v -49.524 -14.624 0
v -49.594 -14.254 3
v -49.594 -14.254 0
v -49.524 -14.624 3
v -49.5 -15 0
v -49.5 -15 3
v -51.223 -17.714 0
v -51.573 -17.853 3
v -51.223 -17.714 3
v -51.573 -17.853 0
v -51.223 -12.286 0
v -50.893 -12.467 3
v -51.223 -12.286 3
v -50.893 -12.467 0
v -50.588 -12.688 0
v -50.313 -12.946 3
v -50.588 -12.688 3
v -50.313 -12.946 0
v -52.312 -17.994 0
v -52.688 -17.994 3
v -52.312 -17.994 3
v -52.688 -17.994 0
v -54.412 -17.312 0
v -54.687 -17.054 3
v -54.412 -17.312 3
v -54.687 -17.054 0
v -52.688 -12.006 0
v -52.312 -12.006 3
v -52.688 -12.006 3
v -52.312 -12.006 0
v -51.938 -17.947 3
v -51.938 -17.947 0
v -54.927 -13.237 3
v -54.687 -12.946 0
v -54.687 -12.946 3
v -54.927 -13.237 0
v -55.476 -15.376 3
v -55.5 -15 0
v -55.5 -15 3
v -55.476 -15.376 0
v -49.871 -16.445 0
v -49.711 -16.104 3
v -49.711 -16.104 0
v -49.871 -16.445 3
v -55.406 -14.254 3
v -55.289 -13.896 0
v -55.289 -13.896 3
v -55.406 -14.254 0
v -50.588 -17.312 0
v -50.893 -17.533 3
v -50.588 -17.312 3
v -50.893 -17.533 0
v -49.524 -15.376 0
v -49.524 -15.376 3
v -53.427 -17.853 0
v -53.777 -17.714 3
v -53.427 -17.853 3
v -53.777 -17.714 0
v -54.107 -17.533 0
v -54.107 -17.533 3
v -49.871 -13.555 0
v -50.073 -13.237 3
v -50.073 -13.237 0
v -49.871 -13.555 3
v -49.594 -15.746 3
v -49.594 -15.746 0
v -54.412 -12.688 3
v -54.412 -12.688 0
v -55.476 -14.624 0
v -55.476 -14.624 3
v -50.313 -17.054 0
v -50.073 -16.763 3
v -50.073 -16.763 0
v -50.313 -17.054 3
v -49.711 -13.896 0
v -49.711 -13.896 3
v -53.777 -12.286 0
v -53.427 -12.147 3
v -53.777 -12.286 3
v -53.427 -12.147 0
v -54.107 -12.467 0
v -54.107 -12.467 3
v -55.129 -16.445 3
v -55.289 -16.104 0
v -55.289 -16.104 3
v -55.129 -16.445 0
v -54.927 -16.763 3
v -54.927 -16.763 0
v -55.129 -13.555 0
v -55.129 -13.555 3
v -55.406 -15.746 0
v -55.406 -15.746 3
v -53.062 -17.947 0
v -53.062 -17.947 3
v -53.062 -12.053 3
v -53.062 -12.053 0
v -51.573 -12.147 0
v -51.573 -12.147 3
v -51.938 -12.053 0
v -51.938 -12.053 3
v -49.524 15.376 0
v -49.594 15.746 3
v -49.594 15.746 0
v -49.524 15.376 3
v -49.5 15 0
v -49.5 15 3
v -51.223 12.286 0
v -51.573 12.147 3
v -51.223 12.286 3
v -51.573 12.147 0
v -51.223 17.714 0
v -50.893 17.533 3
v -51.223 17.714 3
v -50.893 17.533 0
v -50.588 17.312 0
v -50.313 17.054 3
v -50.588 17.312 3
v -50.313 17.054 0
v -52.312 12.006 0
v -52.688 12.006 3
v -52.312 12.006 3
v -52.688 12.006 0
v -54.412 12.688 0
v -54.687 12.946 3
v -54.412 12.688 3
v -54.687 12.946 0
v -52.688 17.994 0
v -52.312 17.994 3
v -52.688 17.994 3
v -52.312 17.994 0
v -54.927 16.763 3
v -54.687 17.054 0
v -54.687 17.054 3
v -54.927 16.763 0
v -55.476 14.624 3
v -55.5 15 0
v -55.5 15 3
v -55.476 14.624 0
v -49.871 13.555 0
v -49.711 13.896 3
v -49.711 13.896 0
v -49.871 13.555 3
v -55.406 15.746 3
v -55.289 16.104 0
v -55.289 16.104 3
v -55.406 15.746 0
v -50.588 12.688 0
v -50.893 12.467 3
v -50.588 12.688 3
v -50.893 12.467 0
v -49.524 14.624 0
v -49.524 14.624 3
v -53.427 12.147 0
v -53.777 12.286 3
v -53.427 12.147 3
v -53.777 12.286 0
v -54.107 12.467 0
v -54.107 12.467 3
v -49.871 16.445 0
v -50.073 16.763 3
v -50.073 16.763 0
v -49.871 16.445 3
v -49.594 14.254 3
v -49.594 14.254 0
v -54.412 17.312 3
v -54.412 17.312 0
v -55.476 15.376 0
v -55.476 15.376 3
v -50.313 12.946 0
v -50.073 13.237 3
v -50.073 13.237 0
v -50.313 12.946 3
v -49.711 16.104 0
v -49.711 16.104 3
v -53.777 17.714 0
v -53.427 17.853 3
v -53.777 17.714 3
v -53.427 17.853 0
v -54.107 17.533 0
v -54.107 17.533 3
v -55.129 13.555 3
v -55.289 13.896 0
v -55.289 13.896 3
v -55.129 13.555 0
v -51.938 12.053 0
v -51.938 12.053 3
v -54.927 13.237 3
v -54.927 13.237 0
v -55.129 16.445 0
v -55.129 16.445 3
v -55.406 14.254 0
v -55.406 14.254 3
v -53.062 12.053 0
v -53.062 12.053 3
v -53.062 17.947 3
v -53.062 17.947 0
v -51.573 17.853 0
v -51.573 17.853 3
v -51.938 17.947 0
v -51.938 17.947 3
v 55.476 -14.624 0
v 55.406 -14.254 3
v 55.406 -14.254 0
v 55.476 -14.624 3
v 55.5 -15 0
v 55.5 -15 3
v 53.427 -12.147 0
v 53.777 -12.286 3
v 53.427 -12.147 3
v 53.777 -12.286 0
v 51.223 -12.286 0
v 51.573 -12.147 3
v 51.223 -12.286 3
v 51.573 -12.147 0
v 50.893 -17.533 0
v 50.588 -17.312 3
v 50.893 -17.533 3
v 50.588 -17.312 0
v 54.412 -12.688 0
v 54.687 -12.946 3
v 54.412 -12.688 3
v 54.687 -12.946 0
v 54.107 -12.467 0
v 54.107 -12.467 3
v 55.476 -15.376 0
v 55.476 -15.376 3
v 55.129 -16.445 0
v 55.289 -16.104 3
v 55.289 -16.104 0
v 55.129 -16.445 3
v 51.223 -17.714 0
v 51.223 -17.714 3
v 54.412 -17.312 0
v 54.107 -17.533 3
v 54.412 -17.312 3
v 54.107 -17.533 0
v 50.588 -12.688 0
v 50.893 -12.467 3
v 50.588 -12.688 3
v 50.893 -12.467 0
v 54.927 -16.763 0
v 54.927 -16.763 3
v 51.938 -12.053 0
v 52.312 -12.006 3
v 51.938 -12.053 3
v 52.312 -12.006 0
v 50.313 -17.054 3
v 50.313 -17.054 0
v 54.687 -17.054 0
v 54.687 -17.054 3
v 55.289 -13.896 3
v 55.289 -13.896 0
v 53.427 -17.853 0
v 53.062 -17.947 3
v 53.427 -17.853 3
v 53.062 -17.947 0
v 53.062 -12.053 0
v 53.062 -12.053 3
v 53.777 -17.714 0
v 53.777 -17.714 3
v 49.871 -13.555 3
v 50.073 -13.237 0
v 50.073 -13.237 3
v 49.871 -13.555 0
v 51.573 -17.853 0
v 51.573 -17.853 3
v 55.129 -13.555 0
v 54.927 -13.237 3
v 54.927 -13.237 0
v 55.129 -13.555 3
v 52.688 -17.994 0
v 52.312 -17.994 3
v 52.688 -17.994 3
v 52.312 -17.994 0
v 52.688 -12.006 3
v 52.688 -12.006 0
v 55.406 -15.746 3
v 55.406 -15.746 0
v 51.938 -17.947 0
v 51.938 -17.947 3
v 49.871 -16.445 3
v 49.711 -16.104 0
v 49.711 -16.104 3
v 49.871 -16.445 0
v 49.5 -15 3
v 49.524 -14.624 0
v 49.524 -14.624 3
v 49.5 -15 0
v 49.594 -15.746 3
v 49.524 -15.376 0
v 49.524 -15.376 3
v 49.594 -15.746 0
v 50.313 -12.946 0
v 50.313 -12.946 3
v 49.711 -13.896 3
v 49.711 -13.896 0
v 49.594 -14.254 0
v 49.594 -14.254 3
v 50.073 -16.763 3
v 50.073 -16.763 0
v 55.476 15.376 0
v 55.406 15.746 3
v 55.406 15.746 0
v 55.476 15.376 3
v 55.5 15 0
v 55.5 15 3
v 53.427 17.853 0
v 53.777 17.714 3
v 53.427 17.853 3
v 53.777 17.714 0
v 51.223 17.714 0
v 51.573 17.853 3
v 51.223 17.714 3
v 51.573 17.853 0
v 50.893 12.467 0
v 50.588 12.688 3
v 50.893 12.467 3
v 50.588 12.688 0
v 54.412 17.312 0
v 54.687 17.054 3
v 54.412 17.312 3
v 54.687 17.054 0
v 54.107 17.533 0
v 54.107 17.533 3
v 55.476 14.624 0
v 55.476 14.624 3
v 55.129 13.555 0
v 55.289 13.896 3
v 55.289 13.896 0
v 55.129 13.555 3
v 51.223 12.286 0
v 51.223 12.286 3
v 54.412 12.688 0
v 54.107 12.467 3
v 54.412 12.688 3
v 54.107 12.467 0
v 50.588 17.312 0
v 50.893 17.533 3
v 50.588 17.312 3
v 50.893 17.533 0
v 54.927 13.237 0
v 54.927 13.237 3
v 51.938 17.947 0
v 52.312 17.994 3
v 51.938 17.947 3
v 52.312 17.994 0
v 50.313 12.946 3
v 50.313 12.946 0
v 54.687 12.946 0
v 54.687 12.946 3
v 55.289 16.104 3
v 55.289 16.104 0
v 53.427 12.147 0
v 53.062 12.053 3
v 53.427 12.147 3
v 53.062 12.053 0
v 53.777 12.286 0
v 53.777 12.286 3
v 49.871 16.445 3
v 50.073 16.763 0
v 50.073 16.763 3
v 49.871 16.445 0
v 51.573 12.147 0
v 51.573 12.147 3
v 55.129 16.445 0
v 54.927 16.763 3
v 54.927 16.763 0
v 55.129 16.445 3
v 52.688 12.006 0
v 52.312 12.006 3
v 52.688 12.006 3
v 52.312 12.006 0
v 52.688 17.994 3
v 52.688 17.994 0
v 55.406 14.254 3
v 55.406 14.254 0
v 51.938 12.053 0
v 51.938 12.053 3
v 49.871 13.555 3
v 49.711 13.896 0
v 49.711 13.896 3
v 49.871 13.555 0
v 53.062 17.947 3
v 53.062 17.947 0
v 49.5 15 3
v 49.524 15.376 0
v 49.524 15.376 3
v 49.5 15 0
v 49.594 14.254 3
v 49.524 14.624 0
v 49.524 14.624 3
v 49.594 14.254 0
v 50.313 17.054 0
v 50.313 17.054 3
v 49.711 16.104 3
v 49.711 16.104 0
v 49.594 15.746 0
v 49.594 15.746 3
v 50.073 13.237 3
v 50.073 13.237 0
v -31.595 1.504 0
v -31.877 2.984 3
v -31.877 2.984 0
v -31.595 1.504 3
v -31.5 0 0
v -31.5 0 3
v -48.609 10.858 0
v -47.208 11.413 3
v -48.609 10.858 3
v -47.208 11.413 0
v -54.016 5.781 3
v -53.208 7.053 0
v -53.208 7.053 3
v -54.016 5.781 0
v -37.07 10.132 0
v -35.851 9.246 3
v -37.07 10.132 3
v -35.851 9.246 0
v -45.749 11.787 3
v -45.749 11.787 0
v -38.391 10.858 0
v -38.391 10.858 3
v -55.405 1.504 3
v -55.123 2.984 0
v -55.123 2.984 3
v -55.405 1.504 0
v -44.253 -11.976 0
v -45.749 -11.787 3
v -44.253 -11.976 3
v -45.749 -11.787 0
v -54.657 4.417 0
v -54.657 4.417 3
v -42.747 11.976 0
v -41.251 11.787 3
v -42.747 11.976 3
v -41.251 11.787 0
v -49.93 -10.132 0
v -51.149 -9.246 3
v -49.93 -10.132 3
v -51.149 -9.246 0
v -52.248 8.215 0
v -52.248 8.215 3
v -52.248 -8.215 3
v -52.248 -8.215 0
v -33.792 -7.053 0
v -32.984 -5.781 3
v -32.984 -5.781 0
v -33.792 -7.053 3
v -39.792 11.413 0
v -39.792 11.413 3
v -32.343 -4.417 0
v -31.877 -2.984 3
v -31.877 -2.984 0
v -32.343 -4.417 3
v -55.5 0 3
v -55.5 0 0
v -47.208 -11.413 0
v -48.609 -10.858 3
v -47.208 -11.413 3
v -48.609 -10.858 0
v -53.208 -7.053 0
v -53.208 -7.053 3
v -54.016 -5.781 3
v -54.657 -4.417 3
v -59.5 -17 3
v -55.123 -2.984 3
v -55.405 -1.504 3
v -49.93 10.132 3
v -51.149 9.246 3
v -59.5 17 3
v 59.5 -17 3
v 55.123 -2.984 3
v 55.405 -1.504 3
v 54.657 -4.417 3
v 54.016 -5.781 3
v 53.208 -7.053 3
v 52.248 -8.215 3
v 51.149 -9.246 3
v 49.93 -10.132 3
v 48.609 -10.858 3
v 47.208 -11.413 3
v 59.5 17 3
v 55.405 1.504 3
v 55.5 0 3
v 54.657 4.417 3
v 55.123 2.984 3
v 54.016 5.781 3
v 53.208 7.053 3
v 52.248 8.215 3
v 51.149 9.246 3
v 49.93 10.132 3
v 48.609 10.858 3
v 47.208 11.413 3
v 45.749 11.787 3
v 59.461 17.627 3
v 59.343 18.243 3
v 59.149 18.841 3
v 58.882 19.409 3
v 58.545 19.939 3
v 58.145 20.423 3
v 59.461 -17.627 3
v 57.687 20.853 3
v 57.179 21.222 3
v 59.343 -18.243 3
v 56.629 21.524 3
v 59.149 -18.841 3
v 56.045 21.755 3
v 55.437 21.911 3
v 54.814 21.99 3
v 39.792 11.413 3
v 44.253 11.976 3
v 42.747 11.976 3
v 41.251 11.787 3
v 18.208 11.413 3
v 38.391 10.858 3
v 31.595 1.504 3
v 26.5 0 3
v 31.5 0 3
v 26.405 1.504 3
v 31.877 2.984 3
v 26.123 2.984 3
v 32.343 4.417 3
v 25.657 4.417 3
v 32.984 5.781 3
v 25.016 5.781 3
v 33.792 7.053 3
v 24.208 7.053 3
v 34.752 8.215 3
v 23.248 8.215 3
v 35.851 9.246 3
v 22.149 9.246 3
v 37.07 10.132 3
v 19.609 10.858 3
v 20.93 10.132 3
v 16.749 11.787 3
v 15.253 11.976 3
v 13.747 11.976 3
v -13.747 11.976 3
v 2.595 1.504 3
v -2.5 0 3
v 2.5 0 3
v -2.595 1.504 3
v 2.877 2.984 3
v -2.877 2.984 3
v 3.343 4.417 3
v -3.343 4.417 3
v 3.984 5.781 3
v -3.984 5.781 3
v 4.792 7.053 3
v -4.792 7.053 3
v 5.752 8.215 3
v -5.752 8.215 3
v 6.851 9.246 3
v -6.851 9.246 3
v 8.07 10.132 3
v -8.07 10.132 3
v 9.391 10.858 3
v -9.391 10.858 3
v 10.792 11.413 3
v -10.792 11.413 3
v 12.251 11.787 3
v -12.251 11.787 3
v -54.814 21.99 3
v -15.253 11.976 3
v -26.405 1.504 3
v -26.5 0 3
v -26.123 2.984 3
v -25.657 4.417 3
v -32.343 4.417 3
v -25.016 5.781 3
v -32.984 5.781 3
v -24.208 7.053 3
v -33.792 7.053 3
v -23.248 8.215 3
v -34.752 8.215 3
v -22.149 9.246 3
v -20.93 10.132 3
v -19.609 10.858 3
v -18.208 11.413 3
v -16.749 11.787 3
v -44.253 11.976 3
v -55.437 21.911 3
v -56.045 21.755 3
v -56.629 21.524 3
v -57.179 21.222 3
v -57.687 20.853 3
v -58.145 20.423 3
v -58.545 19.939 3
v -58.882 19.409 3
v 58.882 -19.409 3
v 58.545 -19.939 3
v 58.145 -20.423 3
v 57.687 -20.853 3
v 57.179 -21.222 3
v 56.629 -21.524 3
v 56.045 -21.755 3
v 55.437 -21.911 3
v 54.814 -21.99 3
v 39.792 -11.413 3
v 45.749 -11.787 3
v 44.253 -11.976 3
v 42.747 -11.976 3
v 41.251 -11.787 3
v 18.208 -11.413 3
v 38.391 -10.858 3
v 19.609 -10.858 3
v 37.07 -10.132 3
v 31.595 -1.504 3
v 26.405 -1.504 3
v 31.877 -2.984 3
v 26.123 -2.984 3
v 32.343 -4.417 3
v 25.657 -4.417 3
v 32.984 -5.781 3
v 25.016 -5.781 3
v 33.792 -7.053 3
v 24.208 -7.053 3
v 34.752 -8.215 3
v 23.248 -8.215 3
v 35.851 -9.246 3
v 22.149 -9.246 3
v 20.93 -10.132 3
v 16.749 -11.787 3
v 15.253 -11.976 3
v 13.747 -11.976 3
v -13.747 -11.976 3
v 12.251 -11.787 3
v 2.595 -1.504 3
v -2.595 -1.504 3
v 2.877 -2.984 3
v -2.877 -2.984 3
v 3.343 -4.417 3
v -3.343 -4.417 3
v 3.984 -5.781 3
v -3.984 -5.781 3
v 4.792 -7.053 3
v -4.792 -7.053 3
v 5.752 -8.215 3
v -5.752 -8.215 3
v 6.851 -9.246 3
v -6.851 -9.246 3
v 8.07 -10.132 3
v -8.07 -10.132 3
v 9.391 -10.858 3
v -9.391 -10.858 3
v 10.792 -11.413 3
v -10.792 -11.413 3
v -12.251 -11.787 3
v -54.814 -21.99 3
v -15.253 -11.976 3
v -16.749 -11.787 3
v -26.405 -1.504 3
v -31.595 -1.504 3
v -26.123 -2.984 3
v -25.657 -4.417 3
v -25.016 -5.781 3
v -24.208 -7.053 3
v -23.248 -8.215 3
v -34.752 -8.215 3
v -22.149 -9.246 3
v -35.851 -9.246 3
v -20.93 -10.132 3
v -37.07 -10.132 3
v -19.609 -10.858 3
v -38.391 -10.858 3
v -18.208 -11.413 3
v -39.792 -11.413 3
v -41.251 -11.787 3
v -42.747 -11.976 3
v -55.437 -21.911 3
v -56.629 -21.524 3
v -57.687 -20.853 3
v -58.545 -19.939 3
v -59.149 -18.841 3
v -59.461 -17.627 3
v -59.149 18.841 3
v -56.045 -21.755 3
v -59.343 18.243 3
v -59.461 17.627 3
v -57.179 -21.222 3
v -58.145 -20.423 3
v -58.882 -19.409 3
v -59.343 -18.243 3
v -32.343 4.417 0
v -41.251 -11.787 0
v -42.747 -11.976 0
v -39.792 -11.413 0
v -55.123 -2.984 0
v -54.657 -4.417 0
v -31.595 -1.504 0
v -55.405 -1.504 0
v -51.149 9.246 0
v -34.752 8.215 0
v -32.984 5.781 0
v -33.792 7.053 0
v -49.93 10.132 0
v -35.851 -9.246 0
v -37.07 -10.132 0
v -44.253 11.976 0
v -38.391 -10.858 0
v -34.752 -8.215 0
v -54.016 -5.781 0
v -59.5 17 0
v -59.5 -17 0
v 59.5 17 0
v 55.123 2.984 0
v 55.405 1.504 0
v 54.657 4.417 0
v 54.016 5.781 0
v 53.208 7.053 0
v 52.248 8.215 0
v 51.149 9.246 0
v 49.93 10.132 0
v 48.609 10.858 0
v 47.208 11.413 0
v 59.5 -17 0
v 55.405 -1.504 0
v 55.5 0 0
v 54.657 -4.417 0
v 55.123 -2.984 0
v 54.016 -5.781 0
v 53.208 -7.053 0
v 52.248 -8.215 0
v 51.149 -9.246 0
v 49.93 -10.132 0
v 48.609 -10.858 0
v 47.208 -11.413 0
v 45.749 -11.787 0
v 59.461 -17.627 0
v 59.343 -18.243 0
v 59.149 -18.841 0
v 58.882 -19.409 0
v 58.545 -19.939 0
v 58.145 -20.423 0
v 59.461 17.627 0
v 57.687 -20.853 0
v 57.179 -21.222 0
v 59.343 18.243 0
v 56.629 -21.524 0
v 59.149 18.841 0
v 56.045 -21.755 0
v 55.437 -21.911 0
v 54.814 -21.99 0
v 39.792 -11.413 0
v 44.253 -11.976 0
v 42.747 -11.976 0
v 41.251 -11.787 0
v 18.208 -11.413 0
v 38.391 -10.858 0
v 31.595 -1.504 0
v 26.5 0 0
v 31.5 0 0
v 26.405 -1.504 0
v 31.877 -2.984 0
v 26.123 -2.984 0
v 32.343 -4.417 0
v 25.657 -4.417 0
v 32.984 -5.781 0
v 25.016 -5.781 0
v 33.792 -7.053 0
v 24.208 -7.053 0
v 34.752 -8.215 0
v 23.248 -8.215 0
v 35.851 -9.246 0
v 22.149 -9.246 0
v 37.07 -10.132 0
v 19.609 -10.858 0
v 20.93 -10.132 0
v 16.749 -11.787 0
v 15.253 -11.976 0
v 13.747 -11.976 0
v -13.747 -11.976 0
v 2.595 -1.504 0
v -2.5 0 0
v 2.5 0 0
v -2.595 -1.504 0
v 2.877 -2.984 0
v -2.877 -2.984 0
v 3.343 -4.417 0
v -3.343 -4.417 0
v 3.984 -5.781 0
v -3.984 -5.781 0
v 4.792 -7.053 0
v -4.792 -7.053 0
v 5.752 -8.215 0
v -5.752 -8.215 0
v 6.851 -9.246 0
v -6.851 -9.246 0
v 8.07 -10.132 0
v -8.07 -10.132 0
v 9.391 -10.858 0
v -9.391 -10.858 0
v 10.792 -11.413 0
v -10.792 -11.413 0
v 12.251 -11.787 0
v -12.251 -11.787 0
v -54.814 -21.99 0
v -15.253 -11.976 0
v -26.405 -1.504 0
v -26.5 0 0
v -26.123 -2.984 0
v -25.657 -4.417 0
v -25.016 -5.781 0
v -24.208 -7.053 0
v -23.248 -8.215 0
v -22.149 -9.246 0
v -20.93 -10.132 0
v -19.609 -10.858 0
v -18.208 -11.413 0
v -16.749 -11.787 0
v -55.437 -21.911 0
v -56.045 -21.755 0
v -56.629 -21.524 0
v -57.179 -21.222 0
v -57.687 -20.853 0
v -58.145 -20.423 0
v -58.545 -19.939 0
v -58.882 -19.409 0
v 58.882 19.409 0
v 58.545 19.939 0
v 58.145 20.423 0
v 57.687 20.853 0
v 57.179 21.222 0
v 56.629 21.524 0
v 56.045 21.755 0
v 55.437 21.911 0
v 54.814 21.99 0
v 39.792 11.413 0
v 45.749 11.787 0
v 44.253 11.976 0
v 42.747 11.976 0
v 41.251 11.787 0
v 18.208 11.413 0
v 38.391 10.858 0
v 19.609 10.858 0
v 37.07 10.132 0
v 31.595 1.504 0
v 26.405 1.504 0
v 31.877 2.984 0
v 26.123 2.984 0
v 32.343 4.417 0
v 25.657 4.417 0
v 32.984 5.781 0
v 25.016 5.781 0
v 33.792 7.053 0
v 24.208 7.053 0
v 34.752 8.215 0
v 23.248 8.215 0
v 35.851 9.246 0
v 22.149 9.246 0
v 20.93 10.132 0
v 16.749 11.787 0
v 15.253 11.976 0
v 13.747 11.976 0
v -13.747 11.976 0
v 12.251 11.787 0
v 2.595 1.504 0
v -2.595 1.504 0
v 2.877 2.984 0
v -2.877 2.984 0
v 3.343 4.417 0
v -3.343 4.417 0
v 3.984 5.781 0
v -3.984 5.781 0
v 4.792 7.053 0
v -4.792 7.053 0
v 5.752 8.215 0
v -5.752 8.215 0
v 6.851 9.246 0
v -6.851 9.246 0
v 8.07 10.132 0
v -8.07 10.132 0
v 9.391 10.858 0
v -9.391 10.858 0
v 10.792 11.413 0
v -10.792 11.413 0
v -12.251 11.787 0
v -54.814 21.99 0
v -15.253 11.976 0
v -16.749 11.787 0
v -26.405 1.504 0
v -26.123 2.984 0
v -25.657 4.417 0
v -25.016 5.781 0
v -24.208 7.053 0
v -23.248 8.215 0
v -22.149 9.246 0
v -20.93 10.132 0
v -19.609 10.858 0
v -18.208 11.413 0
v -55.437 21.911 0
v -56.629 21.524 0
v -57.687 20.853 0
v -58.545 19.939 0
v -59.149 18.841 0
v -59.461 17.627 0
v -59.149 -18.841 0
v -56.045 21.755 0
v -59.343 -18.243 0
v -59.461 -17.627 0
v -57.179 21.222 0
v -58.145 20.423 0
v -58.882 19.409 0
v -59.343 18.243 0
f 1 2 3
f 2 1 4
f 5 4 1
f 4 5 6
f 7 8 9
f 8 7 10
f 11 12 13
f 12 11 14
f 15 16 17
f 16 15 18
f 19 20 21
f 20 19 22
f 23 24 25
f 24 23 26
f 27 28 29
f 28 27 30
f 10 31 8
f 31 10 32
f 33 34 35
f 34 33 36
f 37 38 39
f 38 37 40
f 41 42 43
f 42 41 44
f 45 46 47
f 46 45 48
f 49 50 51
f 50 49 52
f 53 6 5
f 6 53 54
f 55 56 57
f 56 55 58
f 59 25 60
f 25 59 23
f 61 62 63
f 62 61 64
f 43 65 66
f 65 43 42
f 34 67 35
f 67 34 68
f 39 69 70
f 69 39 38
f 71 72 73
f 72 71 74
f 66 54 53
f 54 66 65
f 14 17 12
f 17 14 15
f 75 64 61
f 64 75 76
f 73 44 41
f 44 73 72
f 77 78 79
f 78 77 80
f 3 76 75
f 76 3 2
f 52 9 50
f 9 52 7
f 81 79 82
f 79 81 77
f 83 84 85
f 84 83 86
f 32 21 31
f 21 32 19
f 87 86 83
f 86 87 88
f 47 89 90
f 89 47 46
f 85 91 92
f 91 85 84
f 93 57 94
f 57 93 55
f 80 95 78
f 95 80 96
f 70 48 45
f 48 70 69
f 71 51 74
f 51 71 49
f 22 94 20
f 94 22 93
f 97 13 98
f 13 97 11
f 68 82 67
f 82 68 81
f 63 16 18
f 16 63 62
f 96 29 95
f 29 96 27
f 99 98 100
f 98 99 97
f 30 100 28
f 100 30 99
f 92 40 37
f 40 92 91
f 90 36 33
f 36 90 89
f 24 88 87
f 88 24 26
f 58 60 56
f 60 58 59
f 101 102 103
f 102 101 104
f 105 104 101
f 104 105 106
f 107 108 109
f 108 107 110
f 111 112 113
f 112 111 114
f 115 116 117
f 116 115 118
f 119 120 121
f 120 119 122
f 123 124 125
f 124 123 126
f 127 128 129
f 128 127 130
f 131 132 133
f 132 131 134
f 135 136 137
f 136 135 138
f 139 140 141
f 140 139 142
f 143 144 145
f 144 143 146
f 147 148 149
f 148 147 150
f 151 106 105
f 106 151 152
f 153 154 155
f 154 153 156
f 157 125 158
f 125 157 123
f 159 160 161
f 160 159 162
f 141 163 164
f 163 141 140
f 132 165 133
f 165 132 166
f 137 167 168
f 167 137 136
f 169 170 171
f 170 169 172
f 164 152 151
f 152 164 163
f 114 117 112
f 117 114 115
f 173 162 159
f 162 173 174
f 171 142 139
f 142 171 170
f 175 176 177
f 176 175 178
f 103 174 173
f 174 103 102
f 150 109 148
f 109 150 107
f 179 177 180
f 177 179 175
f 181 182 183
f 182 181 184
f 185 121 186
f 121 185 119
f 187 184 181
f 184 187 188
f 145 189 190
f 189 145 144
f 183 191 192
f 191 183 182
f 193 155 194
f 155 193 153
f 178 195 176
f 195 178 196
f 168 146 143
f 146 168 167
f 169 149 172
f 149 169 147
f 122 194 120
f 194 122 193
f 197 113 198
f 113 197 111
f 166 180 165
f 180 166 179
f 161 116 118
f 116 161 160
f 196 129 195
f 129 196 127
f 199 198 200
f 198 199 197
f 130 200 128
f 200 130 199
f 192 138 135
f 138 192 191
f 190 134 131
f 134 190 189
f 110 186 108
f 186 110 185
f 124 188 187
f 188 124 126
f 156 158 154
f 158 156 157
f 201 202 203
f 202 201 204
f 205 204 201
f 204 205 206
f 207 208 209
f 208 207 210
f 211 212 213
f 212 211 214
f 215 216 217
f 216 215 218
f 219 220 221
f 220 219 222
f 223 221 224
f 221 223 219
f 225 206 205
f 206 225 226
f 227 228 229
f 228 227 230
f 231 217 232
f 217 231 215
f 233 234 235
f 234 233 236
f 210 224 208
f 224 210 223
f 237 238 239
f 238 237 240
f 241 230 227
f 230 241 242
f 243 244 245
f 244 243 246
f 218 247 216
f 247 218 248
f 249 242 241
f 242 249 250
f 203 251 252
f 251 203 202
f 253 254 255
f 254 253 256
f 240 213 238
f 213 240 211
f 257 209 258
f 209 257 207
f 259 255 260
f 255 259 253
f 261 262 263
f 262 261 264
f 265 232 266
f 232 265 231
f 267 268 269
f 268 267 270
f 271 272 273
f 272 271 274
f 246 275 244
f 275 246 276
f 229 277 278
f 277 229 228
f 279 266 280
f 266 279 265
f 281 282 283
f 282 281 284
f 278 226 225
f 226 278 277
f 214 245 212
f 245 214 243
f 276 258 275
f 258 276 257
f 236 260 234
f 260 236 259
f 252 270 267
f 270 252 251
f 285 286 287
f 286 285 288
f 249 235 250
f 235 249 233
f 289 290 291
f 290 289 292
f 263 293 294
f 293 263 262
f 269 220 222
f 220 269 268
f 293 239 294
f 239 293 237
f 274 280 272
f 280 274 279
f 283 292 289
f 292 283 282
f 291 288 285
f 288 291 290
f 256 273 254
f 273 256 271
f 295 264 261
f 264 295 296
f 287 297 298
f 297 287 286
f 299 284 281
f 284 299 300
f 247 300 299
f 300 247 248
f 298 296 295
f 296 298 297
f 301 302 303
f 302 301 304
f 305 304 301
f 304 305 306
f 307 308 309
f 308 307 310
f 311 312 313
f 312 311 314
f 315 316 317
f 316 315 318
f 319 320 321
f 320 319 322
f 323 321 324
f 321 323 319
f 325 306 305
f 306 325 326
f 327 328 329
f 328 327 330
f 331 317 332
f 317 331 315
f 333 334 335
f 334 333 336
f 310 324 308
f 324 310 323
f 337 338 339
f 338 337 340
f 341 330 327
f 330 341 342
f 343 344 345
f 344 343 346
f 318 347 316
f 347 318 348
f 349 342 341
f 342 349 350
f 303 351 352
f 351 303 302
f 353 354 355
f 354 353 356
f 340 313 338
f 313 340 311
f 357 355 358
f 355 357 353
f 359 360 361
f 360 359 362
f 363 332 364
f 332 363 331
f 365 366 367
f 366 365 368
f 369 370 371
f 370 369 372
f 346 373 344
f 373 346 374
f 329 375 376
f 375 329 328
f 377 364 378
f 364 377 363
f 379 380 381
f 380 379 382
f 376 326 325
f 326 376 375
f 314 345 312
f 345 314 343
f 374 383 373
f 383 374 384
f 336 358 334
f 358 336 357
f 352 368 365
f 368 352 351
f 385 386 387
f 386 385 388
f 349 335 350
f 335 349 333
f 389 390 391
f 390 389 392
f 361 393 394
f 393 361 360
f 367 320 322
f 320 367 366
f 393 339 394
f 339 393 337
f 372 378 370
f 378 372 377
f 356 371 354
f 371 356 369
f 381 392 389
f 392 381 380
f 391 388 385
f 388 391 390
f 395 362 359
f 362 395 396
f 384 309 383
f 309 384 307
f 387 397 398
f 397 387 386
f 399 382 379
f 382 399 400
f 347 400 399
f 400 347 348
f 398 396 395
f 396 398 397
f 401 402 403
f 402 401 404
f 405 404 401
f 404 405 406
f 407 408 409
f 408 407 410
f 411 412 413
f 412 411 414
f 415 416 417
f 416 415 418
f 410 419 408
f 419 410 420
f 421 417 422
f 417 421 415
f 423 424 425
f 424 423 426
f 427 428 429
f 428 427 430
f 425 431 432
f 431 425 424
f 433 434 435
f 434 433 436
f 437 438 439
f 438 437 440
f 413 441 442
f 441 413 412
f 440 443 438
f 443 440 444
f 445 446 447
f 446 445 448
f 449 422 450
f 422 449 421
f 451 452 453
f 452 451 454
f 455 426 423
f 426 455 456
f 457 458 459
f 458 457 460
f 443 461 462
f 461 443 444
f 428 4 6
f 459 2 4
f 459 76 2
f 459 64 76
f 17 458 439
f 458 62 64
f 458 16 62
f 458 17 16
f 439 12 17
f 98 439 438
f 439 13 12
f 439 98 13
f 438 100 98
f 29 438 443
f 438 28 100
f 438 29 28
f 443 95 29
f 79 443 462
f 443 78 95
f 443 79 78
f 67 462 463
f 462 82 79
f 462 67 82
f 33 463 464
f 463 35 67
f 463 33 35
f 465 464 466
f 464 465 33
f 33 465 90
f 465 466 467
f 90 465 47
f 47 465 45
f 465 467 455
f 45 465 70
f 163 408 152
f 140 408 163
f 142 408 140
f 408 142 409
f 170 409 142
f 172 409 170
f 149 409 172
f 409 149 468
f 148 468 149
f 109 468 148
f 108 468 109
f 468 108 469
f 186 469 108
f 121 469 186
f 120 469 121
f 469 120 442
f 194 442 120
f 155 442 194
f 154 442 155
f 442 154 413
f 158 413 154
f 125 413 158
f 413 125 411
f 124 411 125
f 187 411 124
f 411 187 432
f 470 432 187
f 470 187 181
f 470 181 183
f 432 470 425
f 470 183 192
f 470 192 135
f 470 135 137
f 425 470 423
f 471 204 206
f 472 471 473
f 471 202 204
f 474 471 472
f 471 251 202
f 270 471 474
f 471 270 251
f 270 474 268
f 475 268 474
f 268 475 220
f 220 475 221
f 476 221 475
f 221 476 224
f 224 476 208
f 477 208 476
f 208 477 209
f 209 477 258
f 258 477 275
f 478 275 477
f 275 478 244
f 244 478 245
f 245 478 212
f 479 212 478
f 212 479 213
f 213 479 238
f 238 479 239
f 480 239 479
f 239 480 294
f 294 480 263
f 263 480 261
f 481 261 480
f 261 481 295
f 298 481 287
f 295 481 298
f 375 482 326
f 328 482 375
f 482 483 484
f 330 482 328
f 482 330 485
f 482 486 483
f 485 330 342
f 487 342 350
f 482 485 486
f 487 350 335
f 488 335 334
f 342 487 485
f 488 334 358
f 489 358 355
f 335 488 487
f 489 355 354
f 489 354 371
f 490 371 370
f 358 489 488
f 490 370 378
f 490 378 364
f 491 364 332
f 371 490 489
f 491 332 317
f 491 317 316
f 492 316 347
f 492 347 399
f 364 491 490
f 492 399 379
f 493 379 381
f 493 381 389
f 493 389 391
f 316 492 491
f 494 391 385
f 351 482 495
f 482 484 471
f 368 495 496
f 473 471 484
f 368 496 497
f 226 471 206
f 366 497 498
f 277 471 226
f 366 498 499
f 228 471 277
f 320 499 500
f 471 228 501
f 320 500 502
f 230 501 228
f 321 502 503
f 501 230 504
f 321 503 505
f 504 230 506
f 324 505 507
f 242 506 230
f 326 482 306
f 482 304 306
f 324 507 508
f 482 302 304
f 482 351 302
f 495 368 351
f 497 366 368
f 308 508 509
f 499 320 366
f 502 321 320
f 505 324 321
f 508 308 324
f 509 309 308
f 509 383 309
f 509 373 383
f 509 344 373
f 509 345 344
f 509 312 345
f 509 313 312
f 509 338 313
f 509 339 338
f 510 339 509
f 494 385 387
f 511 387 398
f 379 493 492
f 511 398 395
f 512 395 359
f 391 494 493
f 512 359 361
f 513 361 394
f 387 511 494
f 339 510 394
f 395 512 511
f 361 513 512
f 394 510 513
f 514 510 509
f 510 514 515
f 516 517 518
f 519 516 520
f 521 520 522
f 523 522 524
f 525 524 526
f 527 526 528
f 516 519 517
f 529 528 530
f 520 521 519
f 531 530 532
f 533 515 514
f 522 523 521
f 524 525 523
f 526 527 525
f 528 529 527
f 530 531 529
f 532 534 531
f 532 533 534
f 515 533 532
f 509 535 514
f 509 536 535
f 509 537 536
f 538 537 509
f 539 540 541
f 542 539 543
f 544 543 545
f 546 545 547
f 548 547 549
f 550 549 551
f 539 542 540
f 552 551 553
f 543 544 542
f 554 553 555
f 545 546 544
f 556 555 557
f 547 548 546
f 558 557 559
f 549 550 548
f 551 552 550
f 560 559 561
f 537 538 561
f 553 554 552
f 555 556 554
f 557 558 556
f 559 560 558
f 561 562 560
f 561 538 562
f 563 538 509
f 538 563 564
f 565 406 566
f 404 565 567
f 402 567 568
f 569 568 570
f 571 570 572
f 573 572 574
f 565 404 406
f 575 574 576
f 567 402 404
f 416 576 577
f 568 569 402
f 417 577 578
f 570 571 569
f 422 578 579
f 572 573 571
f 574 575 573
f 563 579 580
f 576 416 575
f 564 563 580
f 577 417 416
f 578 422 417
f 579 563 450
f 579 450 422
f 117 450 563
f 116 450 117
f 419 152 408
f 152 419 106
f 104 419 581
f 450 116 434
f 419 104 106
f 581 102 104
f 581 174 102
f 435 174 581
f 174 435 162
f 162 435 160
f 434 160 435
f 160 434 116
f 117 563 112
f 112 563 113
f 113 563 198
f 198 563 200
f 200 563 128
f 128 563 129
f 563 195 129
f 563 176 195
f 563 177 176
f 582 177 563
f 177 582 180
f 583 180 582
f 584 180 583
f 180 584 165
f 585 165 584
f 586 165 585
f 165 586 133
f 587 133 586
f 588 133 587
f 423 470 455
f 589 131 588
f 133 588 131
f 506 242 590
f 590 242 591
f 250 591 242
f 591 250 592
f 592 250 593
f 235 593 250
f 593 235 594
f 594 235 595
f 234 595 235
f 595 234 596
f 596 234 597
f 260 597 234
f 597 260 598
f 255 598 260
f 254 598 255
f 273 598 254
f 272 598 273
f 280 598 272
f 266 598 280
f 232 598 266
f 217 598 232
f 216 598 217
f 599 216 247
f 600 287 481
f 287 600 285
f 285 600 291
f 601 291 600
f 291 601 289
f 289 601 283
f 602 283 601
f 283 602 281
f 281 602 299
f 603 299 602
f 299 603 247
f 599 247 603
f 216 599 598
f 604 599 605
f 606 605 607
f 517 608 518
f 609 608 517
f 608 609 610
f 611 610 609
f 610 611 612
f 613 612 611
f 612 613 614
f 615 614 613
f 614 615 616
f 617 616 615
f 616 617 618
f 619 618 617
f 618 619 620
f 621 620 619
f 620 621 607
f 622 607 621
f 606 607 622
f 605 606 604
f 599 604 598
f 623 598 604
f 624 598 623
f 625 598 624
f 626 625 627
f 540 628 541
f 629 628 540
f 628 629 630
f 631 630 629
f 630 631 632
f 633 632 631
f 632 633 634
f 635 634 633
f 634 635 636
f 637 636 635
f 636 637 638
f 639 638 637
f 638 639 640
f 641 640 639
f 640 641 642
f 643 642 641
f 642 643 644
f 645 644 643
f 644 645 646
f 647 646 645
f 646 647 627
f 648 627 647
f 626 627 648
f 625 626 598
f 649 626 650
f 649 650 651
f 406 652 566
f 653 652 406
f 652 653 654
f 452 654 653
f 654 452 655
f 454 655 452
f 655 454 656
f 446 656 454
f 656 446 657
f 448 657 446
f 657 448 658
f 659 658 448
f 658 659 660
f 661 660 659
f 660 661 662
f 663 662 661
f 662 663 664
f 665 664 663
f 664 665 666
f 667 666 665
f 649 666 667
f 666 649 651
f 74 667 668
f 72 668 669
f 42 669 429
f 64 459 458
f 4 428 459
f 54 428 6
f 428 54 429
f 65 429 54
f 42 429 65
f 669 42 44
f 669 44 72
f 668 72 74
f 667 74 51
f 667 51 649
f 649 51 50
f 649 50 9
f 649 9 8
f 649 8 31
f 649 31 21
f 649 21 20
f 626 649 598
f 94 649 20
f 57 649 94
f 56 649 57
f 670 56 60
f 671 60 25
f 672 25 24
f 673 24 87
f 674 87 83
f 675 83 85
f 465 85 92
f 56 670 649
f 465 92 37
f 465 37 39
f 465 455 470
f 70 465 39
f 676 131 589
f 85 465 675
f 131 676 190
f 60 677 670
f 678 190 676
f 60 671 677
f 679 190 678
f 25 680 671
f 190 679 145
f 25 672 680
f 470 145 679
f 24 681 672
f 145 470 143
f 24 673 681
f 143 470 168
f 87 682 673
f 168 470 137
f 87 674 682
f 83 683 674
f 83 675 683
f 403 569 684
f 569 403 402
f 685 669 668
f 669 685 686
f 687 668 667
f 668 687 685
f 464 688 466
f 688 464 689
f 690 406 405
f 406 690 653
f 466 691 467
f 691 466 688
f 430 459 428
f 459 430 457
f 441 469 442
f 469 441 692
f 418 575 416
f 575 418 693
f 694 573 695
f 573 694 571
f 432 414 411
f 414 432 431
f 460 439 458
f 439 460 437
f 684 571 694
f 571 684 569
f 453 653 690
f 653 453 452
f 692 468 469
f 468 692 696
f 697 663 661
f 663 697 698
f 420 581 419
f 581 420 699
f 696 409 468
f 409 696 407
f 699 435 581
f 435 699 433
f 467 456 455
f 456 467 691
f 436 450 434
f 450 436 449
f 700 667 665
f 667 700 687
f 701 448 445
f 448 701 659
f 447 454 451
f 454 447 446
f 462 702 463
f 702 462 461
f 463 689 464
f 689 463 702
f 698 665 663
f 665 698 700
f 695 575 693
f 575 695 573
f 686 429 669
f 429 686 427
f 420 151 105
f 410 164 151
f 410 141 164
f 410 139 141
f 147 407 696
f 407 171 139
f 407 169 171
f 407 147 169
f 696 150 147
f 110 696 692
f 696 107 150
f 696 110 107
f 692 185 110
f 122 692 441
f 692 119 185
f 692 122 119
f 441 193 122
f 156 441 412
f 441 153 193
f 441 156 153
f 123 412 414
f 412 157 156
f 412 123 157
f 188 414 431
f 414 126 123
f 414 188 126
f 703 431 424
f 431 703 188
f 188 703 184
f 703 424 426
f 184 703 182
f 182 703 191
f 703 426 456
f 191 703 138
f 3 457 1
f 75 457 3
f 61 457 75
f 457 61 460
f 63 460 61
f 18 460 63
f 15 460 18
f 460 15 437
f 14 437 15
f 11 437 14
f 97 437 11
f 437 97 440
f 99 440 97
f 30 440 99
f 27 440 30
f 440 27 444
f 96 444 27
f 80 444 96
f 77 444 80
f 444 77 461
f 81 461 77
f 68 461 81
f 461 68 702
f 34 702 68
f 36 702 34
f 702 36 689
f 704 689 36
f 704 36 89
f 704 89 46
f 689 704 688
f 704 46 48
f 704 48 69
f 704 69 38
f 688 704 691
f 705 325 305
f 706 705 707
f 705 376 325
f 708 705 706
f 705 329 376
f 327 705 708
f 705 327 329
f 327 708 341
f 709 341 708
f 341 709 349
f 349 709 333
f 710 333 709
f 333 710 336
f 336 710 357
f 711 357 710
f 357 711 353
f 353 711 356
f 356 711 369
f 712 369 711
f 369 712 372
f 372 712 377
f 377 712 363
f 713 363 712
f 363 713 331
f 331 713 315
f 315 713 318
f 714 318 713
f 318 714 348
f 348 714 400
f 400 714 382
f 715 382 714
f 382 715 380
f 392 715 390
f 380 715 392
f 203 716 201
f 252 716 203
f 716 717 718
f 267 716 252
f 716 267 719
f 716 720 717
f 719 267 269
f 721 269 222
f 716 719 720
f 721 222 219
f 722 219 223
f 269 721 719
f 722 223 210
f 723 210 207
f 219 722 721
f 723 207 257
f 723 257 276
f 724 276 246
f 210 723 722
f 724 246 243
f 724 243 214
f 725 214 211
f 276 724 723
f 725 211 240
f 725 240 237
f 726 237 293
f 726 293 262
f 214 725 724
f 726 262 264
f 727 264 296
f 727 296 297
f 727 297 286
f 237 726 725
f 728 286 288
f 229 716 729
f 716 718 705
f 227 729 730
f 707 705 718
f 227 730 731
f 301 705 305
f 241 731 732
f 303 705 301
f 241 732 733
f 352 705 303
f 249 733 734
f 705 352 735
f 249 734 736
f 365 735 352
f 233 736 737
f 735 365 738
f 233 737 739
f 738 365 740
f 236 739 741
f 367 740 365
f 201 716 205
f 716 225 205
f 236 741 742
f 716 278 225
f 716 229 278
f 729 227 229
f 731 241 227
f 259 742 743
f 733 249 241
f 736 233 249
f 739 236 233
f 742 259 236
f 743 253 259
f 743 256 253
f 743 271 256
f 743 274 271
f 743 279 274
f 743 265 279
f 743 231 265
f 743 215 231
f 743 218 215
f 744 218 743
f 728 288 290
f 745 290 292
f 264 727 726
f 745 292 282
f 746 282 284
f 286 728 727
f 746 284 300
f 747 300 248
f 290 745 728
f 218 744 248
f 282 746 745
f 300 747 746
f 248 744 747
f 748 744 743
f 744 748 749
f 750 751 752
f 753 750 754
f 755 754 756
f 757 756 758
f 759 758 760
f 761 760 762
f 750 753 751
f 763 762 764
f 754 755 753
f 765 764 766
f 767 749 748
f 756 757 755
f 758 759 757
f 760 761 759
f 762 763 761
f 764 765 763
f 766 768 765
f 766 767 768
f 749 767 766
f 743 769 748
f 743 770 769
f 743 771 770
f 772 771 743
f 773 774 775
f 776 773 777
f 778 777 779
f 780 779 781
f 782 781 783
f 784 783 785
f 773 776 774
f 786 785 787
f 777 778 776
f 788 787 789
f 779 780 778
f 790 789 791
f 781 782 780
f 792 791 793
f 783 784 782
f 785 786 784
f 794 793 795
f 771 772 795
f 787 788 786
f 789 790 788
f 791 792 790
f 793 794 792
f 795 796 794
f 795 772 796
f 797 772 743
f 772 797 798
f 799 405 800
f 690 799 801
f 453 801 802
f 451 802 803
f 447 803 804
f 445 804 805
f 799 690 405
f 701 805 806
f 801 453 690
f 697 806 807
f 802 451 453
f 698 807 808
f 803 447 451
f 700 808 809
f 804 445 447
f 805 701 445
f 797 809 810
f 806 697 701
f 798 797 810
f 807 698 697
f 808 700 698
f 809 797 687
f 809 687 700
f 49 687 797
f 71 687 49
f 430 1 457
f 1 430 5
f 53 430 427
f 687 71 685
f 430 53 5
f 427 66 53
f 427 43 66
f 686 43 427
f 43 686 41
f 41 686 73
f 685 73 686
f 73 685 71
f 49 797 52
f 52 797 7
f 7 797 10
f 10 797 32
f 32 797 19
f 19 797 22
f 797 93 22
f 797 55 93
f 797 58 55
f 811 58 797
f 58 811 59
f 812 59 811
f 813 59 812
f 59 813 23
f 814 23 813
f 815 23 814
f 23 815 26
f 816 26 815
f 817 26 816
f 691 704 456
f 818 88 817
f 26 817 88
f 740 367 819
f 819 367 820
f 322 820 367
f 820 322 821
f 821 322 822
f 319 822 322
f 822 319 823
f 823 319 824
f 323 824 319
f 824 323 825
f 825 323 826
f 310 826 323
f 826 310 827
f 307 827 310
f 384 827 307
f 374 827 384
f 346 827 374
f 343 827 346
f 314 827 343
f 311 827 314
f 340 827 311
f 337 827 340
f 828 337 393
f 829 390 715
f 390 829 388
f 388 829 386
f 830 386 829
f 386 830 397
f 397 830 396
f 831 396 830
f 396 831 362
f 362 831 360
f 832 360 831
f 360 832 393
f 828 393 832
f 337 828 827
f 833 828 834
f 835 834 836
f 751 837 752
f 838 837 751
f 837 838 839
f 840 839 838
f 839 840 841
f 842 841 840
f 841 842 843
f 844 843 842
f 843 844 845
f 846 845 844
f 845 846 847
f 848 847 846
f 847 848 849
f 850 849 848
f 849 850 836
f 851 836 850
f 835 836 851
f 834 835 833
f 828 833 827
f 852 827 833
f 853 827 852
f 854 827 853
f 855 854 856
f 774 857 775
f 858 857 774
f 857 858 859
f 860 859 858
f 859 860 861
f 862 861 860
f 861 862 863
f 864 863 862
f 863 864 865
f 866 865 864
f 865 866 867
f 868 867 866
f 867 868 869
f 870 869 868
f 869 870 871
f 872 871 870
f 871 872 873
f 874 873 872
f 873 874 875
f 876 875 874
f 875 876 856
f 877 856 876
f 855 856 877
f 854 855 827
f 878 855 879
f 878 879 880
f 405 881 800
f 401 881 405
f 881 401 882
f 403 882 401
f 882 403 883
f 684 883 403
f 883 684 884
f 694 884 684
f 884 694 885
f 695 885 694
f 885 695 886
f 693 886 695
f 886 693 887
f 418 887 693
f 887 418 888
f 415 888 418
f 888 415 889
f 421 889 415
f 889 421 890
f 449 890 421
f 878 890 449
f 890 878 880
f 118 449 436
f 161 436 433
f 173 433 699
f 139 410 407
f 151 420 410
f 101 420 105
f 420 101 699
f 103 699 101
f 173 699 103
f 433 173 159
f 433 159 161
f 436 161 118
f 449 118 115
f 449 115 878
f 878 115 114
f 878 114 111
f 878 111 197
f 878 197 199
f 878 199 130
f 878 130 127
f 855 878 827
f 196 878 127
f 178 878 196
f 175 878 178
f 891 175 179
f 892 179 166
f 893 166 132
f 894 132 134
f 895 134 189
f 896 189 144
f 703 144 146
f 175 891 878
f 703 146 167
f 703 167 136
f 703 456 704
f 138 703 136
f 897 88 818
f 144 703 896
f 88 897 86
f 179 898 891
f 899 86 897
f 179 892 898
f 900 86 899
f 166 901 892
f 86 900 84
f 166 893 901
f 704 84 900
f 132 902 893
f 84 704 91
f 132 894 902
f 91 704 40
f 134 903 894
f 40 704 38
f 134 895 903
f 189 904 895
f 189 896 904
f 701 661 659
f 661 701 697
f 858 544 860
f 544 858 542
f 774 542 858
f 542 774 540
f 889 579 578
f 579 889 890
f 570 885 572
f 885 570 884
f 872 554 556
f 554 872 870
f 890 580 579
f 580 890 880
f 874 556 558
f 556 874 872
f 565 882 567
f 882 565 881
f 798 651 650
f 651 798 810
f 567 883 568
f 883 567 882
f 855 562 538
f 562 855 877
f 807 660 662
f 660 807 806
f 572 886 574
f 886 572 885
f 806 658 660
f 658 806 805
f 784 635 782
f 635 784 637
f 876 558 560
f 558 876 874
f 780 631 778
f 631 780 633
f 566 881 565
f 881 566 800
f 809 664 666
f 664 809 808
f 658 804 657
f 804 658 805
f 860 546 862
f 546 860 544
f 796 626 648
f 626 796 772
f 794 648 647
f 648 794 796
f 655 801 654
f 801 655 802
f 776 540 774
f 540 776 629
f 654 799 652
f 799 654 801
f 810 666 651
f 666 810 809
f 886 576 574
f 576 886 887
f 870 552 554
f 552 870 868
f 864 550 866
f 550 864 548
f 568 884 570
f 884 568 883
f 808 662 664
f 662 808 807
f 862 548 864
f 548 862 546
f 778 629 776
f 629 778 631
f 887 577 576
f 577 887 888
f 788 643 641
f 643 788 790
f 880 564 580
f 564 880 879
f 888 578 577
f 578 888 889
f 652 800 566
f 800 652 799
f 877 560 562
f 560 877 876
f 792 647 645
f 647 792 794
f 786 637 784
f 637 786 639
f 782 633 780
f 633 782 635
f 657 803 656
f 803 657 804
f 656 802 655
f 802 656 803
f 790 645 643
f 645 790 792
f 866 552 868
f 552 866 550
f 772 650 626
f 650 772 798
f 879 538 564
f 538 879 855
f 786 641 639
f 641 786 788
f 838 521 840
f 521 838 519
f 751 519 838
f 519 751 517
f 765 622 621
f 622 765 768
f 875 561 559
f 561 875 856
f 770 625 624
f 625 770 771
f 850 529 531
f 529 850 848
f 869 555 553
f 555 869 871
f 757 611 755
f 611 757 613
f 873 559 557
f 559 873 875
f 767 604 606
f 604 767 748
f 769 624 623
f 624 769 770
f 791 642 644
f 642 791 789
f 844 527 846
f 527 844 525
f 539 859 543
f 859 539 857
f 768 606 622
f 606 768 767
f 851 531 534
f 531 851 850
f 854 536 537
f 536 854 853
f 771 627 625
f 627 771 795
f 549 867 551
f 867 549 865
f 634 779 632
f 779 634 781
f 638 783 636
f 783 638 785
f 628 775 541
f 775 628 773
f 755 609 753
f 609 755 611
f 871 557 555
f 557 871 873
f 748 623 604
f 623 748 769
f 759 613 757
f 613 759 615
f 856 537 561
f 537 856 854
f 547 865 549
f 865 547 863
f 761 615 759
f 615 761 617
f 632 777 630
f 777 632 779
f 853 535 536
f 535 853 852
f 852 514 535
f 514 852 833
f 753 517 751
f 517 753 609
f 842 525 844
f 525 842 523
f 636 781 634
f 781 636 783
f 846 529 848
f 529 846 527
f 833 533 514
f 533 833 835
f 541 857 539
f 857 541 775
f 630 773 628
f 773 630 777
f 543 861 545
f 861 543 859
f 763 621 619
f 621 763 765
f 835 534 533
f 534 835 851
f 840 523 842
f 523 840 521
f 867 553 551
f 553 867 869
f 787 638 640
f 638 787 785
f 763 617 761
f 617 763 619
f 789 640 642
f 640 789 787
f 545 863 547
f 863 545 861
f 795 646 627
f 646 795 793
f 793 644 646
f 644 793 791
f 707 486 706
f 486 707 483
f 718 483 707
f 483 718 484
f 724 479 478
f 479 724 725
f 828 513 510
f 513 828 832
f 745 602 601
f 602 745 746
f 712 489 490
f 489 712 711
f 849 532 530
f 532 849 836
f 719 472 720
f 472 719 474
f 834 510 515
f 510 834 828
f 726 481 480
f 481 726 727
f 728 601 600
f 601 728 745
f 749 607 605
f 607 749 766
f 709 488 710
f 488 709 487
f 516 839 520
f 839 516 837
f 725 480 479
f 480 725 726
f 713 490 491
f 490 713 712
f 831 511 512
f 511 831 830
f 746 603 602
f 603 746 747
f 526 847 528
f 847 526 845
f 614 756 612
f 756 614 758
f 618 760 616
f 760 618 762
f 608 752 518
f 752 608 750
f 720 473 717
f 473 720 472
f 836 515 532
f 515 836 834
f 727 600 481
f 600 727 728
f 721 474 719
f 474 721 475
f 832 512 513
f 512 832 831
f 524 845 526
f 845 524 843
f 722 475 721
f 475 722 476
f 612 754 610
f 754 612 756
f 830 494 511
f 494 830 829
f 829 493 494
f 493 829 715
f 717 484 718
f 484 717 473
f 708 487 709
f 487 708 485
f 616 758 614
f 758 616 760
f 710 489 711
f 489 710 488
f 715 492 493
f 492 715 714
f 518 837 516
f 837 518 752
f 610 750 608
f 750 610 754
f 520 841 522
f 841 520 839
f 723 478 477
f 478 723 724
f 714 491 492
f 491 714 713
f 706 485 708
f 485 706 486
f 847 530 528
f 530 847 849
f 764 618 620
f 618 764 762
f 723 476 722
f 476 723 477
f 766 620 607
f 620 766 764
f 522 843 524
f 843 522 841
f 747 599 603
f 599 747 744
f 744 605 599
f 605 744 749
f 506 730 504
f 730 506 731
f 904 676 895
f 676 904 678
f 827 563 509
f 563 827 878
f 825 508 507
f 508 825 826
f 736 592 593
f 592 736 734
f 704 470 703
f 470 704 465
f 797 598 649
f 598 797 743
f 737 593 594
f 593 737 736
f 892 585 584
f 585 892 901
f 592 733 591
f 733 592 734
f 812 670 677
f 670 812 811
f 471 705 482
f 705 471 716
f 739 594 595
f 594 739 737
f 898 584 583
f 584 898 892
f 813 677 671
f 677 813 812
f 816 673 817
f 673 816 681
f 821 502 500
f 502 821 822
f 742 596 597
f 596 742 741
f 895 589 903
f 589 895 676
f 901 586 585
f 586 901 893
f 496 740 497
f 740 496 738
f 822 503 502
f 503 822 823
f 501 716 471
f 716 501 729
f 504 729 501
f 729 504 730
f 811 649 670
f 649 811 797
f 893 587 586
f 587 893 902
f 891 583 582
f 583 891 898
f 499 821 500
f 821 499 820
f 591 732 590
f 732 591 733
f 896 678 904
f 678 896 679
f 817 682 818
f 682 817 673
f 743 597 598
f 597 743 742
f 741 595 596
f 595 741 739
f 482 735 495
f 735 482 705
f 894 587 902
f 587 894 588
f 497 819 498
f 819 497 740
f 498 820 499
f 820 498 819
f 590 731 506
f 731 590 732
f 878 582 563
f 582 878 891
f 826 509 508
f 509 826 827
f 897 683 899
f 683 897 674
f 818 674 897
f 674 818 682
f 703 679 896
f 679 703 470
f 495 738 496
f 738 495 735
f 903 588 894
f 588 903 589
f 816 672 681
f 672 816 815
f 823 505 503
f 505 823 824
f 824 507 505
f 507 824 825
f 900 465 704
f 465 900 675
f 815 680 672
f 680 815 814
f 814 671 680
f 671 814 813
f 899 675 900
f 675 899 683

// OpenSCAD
$fn = 50;


difference() {
	union() {
		hull() {
			translate(v = [-54.5000000000, 17.0000000000, 0]) {
				cylinder(h = 3, r = 5);
			}
			translate(v = [54.5000000000, 17.0000000000, 0]) {
				cylinder(h = 3, r = 5);
			}
			translate(v = [-54.5000000000, -17.0000000000, 0]) {
				cylinder(h = 3, r = 5);
			}
			translate(v = [54.5000000000, -17.0000000000, 0]) {
				cylinder(h = 3, r = 5);
			}
		}
	}
	union() {
		#translate(v = [-52.5000000000, -15.0000000000, -100.0000000000]) {
			cylinder(h = 200, r = 3.0000000000);
		}
		#translate(v = [-52.5000000000, 15.0000000000, -100.0000000000]) {
			cylinder(h = 200, r = 3.0000000000);
		}
		#translate(v = [52.5000000000, -15.0000000000, -100.0000000000]) {
			cylinder(h = 200, r = 3.0000000000);
		}
		#translate(v = [52.5000000000, 15.0000000000, -100.0000000000]) {
			cylinder(h = 200, r = 3.0000000000);
		}
		#translate(v = [-43.5000000000, 0, 0]) {
			cylinder(h = 3, r = 12.0000000000);
		}
		#translate(v = [-14.5000000000, 0, 0]) {
			cylinder(h = 3, r = 12.0000000000);
		}
		#translate(v = [14.5000000000, 0, 0]) {
			cylinder(h = 3, r = 12.0000000000);
		}
		#translate(v = [43.5000000000, 0, 0]) {
			cylinder(h = 3, r = 12.0000000000);
		}
	}
}
